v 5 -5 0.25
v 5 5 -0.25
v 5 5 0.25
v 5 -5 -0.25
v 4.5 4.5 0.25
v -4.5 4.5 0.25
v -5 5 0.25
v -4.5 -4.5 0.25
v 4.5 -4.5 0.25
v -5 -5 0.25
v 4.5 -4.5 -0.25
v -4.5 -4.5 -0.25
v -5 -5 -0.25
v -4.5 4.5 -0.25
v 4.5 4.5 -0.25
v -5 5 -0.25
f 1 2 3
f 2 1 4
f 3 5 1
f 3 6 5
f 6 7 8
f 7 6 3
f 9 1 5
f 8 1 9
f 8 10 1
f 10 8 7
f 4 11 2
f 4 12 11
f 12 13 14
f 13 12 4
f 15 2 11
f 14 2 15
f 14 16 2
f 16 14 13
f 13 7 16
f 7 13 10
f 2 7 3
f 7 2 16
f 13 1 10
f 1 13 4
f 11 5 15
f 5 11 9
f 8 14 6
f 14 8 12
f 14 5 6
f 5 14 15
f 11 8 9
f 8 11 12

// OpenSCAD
width = 10;
offset = 1;
height = .5;

difference() {
    cube([width, width, height], true);
    cube([(width - offset), (width - offset), (height*2)], true);
}
